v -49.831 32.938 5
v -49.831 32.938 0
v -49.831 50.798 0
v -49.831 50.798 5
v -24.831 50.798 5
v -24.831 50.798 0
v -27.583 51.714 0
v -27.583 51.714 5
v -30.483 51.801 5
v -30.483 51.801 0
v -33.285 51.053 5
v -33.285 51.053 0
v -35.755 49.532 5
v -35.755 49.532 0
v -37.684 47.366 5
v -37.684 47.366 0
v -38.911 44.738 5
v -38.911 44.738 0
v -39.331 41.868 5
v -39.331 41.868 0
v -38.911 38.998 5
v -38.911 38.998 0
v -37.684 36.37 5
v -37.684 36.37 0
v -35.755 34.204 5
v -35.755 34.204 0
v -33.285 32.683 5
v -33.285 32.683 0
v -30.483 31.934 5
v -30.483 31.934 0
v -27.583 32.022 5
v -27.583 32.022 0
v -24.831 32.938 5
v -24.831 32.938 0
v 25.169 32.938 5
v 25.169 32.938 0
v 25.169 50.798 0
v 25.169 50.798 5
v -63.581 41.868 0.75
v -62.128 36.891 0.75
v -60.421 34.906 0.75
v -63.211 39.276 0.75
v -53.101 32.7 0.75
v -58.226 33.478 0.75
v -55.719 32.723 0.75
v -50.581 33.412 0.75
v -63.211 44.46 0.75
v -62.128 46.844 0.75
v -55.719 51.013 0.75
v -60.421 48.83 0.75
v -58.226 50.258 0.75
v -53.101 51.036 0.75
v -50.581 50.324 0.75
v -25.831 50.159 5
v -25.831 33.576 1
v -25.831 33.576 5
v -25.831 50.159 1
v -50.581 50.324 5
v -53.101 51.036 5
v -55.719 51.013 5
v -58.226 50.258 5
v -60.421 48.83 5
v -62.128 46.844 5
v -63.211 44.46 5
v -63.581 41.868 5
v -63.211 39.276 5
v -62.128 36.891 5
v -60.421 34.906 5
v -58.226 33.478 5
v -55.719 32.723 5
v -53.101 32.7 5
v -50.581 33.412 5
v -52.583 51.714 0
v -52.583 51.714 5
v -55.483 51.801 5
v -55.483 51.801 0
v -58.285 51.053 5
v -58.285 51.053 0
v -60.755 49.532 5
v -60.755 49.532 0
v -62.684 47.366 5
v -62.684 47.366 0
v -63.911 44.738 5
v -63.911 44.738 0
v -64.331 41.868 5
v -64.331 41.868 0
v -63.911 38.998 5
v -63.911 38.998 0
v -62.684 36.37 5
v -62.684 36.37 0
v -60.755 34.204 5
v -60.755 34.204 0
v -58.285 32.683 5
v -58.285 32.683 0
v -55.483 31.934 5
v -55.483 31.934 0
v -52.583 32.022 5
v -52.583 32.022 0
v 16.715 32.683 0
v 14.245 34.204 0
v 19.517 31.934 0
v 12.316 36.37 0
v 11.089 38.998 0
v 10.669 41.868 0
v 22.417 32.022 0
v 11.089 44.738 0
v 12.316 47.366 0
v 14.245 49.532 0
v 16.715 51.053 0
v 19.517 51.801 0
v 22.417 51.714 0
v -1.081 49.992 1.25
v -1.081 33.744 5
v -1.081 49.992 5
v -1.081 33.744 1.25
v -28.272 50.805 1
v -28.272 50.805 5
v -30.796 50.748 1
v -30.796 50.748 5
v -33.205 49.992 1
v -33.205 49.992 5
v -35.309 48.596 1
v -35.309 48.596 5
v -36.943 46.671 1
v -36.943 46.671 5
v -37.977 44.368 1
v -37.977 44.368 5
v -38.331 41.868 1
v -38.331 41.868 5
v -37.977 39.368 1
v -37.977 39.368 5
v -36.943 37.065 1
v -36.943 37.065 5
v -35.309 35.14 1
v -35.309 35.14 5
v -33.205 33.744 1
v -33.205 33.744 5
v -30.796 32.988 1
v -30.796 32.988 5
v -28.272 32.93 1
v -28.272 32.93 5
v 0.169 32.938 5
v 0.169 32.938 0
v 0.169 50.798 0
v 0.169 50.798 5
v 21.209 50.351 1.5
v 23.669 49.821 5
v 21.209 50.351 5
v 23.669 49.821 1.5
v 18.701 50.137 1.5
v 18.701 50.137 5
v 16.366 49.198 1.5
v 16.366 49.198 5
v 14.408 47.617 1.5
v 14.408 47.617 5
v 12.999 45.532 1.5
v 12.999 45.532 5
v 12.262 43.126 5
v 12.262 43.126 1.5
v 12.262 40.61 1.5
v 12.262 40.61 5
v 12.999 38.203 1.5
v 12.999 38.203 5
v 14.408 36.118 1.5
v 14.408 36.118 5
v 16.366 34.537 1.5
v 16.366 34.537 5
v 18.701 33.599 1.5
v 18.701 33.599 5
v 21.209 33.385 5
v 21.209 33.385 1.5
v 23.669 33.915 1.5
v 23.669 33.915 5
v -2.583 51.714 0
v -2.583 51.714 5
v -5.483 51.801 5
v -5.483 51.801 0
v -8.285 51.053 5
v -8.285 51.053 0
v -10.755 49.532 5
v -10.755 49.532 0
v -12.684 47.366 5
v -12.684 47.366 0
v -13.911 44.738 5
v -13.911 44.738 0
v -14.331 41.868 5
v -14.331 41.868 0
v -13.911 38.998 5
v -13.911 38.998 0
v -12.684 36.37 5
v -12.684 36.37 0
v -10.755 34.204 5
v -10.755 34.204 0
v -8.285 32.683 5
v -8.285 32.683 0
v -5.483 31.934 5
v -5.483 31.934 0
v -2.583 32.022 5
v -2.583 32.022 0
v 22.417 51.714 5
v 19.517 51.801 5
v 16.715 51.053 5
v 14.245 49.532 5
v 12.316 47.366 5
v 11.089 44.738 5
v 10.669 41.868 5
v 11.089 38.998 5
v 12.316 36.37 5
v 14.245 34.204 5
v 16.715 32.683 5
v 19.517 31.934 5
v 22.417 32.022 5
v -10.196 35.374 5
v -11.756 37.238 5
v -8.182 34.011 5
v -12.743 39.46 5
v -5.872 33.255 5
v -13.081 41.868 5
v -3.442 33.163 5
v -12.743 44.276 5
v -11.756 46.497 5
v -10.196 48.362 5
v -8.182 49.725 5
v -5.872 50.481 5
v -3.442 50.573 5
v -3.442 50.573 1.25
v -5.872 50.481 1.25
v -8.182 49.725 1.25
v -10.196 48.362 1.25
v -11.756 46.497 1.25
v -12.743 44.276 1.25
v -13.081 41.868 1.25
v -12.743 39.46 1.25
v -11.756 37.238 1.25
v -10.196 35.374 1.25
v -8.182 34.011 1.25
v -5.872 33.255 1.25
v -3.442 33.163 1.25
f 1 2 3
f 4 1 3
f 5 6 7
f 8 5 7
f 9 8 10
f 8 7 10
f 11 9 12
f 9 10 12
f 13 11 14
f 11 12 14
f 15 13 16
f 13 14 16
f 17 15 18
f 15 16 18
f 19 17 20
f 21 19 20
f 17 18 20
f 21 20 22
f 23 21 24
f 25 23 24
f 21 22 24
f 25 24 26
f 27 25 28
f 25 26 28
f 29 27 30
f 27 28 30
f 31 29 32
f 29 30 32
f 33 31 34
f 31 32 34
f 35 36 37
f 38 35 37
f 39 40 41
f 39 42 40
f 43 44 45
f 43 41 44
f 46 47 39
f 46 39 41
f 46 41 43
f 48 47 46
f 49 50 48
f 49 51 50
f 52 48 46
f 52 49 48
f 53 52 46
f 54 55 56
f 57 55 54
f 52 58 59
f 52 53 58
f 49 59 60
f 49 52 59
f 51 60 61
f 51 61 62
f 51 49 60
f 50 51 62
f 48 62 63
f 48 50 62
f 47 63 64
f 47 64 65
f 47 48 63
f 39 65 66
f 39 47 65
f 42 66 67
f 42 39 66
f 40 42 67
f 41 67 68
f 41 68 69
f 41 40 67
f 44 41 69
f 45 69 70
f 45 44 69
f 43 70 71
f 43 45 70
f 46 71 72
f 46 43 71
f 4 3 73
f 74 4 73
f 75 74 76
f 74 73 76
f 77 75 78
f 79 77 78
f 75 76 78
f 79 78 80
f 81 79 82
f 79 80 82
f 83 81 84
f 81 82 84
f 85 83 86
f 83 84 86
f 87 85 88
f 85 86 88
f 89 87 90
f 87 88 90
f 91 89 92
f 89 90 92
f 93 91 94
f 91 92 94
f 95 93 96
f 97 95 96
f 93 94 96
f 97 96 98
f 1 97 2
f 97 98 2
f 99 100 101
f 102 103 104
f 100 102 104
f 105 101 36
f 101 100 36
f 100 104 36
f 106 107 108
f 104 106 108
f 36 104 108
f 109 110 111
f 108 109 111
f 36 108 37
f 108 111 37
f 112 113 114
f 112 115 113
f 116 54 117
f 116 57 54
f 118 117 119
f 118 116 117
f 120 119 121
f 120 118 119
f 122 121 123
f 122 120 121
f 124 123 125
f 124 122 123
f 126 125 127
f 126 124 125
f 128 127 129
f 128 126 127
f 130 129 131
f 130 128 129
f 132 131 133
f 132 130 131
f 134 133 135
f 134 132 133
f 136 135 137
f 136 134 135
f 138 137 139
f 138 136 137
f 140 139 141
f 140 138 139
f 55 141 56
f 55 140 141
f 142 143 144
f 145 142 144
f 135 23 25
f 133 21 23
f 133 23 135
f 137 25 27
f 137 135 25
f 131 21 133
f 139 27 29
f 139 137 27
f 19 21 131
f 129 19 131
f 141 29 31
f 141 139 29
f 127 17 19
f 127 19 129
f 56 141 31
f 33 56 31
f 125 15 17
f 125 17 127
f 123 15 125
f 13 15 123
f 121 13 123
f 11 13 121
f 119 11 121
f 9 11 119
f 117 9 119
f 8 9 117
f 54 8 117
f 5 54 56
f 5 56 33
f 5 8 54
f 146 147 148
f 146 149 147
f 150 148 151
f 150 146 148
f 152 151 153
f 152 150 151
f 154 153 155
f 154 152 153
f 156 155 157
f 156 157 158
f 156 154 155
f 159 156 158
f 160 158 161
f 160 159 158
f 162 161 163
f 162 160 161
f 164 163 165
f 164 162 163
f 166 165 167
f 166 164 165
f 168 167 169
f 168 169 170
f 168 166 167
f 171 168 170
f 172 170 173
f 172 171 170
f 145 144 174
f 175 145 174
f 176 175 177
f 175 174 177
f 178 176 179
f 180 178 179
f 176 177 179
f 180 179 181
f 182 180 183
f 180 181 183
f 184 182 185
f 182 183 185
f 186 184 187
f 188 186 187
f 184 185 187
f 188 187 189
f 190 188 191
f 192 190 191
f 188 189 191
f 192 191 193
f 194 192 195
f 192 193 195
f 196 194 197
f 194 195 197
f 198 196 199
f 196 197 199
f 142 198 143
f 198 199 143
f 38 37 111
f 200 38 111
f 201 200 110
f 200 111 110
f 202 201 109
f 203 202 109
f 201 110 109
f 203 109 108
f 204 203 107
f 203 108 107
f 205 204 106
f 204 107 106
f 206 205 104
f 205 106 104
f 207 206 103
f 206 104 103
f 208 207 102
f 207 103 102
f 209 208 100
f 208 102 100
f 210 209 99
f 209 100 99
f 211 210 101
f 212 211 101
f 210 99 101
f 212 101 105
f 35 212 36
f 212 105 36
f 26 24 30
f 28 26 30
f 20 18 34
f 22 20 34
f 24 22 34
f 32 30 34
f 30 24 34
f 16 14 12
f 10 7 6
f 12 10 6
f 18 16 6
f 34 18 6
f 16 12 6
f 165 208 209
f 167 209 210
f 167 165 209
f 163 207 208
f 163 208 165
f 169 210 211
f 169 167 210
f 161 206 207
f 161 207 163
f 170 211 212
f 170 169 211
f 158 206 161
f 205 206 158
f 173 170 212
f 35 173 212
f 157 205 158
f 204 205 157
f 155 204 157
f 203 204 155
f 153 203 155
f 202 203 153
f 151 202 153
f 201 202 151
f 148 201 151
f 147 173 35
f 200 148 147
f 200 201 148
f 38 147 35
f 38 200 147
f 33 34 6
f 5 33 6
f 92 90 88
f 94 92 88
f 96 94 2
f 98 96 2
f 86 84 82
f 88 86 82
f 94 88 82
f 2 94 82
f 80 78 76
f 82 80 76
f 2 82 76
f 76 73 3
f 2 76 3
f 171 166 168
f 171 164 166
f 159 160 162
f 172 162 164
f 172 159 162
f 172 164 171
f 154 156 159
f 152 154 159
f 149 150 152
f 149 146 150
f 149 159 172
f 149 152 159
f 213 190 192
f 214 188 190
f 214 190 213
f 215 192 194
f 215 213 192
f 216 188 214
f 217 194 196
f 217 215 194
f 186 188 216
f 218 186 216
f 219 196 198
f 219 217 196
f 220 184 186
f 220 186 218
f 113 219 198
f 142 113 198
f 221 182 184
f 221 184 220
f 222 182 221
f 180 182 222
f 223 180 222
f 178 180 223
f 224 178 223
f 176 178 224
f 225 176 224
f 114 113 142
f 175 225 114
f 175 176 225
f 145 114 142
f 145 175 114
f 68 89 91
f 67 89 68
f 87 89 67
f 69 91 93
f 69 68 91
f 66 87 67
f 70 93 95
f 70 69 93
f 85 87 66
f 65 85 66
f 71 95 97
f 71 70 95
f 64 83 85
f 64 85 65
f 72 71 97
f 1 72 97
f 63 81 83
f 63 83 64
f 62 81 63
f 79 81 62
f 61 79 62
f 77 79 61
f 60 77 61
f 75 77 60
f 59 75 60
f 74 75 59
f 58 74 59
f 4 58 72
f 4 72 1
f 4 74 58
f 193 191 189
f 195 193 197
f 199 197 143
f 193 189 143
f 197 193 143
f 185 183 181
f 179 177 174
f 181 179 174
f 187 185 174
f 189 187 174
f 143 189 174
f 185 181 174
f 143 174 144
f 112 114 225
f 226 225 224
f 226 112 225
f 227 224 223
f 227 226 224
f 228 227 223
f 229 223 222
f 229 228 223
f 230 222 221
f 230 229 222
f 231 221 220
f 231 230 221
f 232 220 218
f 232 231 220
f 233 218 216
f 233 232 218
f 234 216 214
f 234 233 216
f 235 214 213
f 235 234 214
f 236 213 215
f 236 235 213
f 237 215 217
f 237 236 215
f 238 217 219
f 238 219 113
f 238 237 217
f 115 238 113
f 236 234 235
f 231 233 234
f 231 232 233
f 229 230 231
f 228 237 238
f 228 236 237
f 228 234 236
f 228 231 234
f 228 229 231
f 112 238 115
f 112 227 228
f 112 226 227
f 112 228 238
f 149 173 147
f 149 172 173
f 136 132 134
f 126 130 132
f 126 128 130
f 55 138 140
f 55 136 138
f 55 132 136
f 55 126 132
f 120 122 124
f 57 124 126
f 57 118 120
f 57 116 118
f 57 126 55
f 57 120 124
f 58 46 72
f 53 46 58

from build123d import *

# Parameters (mm, degrees)
F1_DEPTH = 5
F2_T     = -0.75
F3_T     = -1
F4_T     = -1.25
F5_T     = -1.5


with BuildPart() as f1:
    # F0 (on Top) → F1 (new body)
    with BuildSketch(Plane.XY):
        with BuildLine():
            Line((-49.8312081576, 32.9375704042), (-49.8312081576, 50.7981415037))
            ThreePointArc((-49.8312081576, 50.7981415037), (-64.3312081576, 41.8678559539), (-49.8312081576, 32.9375704042))
        make_face()
    extrude(amount=F1_DEPTH)

    # F2
    f2_openings = [f1.faces().sort_by_distance(p)[0] for p in [
        (-56.277542, 41.867856, 5),
    ]]
    offset(amount=F2_T, openings=f2_openings)


with BuildPart() as f1b:
    # F0 (on Top) → F1, piece 2 (new body)
    with BuildSketch(Plane.XY):
        with BuildLine():
            Line((-24.8312081576, 32.9375704042), (-24.8312081576, 50.7981415037))
            ThreePointArc((-24.8312081576, 50.7981415037), (-39.3312081576, 41.8678559539), (-24.8312081576, 32.9375704042))
        make_face()
    extrude(amount=F1_DEPTH)

    # F3
    f3_openings = [f1b.faces().sort_by_distance(p)[0] for p in [
        (-31.277542, 41.867856, 5),
    ]]
    offset(amount=F3_T, openings=f3_openings)


with BuildPart() as f1c:
    # F0 (on Top) → F1, piece 3 (new body)
    with BuildSketch(Plane.XY):
        with BuildLine():
            Line((0.1687918424, 32.9375704042), (0.1687918424, 50.7981415037))
            ThreePointArc((0.1687918424, 50.7981415037), (-14.3312081576, 41.8678559539), (0.1687918424, 32.9375704042))
        make_face()
    extrude(amount=F1_DEPTH)

    # F4
    f4_openings = [f1c.faces().sort_by_distance(p)[0] for p in [
        (-6.277542, 41.867856, 5),
    ]]
    offset(amount=F4_T, openings=f4_openings)


with BuildPart() as f1d:
    # F0 (on Top) → F1, piece 4 (new body)
    with BuildSketch(Plane.XY):
        with BuildLine():
            Line((25.1687918424, 32.9375704042), (25.1687918424, 50.7981415037))
            ThreePointArc((25.1687918424, 50.7981415037), (10.6687918424, 41.8678559539), (25.1687918424, 32.9375704042))
        make_face()
    extrude(amount=F1_DEPTH)

    # F5
    f5_openings = [f1d.faces().sort_by_distance(p)[0] for p in [
        (18.722458, 41.867856, 5),
    ]]
    offset(amount=F5_T, openings=f5_openings)


solid = Compound([f1.part, f1b.part, f1c.part, f1d.part])
